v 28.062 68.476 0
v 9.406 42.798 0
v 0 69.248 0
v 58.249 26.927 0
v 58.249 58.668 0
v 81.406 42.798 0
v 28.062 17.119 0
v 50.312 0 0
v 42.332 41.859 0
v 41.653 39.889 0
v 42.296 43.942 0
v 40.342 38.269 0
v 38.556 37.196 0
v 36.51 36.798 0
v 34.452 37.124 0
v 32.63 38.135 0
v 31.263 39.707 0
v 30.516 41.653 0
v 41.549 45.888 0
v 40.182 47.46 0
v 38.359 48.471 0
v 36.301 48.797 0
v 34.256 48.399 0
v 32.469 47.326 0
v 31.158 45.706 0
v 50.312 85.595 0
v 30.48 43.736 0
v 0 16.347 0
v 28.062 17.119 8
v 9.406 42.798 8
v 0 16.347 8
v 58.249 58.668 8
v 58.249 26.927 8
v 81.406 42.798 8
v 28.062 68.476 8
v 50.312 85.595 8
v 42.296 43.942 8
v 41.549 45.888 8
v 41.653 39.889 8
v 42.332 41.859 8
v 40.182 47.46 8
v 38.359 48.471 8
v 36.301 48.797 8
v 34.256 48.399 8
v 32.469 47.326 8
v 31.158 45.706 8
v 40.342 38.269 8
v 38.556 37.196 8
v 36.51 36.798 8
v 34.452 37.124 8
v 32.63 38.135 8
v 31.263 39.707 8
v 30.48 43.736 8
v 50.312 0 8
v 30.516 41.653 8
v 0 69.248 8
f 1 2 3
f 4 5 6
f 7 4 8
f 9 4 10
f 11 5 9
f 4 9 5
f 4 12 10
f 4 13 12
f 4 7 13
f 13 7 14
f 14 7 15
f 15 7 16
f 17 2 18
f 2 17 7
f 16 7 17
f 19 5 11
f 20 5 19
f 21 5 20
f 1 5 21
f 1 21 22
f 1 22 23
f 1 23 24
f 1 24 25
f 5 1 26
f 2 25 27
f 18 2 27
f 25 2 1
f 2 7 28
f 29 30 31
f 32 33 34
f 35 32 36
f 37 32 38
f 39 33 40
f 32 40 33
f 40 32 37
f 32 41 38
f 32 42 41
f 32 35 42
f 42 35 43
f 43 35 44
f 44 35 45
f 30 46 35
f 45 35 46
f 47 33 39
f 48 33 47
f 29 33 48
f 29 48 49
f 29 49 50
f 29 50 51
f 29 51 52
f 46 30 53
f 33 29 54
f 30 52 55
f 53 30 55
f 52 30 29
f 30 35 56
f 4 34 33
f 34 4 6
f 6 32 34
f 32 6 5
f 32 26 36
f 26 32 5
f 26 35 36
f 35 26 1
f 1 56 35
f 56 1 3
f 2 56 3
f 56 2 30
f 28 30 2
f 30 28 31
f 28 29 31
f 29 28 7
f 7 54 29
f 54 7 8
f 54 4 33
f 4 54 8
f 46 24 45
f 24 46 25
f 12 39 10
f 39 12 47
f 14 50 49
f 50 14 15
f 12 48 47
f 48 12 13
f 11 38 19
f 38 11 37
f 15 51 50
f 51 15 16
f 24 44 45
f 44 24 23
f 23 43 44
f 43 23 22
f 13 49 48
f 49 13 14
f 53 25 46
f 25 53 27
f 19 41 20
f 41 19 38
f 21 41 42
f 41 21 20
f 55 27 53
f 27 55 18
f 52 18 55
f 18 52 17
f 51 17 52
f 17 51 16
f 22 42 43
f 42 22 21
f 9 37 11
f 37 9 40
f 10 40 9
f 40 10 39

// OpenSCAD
$fn = 32;

// ----------------------------------------------------------------------
// Star wheel: 5-point star, R45
// ----------------------------------------------------------------------

// --- parameters (mm) ---
n_points = 5;             // number of points / teeth
r_out = 45;               // tip radius
r_in = 27;                // root radius
bore_r = 6;               // centre bore radius
plate_t = 8;              // plate thickness, Z (extrusion height)
bore_d = 12;              // centre bore diameter

profile = [[81.406, 42.798], [58.249, 58.668], [50.312, 85.595], [28.062, 68.476], [0, 69.248], [9.406, 42.798], [0, 16.347], [28.062, 17.119], [50.312, 0], [58.249, 26.927]];  // primary outline, 10 points, counter clockwise
void_1 = [[42.296, 43.942], [41.549, 45.888], [40.182, 47.46], [38.359, 48.471], [36.301, 48.797], [34.256, 48.399], [32.469, 47.326], [31.158, 45.706], [30.48, 43.736], [30.516, 41.653], [31.263, 39.707], [32.63, 38.135], [34.452, 37.124], [36.51, 36.798], [38.556, 37.196], [40.342, 38.269], [41.653, 39.889], [42.332, 41.859]];  // centre bore, 18 points

// --- the one profile operation ---
difference() {
  linear_extrude(height = plate_t) polygon(points = profile);
  translate([0, 0, -1])
    linear_extrude(height = plate_t + 2) polygon(points = void_1);
}
